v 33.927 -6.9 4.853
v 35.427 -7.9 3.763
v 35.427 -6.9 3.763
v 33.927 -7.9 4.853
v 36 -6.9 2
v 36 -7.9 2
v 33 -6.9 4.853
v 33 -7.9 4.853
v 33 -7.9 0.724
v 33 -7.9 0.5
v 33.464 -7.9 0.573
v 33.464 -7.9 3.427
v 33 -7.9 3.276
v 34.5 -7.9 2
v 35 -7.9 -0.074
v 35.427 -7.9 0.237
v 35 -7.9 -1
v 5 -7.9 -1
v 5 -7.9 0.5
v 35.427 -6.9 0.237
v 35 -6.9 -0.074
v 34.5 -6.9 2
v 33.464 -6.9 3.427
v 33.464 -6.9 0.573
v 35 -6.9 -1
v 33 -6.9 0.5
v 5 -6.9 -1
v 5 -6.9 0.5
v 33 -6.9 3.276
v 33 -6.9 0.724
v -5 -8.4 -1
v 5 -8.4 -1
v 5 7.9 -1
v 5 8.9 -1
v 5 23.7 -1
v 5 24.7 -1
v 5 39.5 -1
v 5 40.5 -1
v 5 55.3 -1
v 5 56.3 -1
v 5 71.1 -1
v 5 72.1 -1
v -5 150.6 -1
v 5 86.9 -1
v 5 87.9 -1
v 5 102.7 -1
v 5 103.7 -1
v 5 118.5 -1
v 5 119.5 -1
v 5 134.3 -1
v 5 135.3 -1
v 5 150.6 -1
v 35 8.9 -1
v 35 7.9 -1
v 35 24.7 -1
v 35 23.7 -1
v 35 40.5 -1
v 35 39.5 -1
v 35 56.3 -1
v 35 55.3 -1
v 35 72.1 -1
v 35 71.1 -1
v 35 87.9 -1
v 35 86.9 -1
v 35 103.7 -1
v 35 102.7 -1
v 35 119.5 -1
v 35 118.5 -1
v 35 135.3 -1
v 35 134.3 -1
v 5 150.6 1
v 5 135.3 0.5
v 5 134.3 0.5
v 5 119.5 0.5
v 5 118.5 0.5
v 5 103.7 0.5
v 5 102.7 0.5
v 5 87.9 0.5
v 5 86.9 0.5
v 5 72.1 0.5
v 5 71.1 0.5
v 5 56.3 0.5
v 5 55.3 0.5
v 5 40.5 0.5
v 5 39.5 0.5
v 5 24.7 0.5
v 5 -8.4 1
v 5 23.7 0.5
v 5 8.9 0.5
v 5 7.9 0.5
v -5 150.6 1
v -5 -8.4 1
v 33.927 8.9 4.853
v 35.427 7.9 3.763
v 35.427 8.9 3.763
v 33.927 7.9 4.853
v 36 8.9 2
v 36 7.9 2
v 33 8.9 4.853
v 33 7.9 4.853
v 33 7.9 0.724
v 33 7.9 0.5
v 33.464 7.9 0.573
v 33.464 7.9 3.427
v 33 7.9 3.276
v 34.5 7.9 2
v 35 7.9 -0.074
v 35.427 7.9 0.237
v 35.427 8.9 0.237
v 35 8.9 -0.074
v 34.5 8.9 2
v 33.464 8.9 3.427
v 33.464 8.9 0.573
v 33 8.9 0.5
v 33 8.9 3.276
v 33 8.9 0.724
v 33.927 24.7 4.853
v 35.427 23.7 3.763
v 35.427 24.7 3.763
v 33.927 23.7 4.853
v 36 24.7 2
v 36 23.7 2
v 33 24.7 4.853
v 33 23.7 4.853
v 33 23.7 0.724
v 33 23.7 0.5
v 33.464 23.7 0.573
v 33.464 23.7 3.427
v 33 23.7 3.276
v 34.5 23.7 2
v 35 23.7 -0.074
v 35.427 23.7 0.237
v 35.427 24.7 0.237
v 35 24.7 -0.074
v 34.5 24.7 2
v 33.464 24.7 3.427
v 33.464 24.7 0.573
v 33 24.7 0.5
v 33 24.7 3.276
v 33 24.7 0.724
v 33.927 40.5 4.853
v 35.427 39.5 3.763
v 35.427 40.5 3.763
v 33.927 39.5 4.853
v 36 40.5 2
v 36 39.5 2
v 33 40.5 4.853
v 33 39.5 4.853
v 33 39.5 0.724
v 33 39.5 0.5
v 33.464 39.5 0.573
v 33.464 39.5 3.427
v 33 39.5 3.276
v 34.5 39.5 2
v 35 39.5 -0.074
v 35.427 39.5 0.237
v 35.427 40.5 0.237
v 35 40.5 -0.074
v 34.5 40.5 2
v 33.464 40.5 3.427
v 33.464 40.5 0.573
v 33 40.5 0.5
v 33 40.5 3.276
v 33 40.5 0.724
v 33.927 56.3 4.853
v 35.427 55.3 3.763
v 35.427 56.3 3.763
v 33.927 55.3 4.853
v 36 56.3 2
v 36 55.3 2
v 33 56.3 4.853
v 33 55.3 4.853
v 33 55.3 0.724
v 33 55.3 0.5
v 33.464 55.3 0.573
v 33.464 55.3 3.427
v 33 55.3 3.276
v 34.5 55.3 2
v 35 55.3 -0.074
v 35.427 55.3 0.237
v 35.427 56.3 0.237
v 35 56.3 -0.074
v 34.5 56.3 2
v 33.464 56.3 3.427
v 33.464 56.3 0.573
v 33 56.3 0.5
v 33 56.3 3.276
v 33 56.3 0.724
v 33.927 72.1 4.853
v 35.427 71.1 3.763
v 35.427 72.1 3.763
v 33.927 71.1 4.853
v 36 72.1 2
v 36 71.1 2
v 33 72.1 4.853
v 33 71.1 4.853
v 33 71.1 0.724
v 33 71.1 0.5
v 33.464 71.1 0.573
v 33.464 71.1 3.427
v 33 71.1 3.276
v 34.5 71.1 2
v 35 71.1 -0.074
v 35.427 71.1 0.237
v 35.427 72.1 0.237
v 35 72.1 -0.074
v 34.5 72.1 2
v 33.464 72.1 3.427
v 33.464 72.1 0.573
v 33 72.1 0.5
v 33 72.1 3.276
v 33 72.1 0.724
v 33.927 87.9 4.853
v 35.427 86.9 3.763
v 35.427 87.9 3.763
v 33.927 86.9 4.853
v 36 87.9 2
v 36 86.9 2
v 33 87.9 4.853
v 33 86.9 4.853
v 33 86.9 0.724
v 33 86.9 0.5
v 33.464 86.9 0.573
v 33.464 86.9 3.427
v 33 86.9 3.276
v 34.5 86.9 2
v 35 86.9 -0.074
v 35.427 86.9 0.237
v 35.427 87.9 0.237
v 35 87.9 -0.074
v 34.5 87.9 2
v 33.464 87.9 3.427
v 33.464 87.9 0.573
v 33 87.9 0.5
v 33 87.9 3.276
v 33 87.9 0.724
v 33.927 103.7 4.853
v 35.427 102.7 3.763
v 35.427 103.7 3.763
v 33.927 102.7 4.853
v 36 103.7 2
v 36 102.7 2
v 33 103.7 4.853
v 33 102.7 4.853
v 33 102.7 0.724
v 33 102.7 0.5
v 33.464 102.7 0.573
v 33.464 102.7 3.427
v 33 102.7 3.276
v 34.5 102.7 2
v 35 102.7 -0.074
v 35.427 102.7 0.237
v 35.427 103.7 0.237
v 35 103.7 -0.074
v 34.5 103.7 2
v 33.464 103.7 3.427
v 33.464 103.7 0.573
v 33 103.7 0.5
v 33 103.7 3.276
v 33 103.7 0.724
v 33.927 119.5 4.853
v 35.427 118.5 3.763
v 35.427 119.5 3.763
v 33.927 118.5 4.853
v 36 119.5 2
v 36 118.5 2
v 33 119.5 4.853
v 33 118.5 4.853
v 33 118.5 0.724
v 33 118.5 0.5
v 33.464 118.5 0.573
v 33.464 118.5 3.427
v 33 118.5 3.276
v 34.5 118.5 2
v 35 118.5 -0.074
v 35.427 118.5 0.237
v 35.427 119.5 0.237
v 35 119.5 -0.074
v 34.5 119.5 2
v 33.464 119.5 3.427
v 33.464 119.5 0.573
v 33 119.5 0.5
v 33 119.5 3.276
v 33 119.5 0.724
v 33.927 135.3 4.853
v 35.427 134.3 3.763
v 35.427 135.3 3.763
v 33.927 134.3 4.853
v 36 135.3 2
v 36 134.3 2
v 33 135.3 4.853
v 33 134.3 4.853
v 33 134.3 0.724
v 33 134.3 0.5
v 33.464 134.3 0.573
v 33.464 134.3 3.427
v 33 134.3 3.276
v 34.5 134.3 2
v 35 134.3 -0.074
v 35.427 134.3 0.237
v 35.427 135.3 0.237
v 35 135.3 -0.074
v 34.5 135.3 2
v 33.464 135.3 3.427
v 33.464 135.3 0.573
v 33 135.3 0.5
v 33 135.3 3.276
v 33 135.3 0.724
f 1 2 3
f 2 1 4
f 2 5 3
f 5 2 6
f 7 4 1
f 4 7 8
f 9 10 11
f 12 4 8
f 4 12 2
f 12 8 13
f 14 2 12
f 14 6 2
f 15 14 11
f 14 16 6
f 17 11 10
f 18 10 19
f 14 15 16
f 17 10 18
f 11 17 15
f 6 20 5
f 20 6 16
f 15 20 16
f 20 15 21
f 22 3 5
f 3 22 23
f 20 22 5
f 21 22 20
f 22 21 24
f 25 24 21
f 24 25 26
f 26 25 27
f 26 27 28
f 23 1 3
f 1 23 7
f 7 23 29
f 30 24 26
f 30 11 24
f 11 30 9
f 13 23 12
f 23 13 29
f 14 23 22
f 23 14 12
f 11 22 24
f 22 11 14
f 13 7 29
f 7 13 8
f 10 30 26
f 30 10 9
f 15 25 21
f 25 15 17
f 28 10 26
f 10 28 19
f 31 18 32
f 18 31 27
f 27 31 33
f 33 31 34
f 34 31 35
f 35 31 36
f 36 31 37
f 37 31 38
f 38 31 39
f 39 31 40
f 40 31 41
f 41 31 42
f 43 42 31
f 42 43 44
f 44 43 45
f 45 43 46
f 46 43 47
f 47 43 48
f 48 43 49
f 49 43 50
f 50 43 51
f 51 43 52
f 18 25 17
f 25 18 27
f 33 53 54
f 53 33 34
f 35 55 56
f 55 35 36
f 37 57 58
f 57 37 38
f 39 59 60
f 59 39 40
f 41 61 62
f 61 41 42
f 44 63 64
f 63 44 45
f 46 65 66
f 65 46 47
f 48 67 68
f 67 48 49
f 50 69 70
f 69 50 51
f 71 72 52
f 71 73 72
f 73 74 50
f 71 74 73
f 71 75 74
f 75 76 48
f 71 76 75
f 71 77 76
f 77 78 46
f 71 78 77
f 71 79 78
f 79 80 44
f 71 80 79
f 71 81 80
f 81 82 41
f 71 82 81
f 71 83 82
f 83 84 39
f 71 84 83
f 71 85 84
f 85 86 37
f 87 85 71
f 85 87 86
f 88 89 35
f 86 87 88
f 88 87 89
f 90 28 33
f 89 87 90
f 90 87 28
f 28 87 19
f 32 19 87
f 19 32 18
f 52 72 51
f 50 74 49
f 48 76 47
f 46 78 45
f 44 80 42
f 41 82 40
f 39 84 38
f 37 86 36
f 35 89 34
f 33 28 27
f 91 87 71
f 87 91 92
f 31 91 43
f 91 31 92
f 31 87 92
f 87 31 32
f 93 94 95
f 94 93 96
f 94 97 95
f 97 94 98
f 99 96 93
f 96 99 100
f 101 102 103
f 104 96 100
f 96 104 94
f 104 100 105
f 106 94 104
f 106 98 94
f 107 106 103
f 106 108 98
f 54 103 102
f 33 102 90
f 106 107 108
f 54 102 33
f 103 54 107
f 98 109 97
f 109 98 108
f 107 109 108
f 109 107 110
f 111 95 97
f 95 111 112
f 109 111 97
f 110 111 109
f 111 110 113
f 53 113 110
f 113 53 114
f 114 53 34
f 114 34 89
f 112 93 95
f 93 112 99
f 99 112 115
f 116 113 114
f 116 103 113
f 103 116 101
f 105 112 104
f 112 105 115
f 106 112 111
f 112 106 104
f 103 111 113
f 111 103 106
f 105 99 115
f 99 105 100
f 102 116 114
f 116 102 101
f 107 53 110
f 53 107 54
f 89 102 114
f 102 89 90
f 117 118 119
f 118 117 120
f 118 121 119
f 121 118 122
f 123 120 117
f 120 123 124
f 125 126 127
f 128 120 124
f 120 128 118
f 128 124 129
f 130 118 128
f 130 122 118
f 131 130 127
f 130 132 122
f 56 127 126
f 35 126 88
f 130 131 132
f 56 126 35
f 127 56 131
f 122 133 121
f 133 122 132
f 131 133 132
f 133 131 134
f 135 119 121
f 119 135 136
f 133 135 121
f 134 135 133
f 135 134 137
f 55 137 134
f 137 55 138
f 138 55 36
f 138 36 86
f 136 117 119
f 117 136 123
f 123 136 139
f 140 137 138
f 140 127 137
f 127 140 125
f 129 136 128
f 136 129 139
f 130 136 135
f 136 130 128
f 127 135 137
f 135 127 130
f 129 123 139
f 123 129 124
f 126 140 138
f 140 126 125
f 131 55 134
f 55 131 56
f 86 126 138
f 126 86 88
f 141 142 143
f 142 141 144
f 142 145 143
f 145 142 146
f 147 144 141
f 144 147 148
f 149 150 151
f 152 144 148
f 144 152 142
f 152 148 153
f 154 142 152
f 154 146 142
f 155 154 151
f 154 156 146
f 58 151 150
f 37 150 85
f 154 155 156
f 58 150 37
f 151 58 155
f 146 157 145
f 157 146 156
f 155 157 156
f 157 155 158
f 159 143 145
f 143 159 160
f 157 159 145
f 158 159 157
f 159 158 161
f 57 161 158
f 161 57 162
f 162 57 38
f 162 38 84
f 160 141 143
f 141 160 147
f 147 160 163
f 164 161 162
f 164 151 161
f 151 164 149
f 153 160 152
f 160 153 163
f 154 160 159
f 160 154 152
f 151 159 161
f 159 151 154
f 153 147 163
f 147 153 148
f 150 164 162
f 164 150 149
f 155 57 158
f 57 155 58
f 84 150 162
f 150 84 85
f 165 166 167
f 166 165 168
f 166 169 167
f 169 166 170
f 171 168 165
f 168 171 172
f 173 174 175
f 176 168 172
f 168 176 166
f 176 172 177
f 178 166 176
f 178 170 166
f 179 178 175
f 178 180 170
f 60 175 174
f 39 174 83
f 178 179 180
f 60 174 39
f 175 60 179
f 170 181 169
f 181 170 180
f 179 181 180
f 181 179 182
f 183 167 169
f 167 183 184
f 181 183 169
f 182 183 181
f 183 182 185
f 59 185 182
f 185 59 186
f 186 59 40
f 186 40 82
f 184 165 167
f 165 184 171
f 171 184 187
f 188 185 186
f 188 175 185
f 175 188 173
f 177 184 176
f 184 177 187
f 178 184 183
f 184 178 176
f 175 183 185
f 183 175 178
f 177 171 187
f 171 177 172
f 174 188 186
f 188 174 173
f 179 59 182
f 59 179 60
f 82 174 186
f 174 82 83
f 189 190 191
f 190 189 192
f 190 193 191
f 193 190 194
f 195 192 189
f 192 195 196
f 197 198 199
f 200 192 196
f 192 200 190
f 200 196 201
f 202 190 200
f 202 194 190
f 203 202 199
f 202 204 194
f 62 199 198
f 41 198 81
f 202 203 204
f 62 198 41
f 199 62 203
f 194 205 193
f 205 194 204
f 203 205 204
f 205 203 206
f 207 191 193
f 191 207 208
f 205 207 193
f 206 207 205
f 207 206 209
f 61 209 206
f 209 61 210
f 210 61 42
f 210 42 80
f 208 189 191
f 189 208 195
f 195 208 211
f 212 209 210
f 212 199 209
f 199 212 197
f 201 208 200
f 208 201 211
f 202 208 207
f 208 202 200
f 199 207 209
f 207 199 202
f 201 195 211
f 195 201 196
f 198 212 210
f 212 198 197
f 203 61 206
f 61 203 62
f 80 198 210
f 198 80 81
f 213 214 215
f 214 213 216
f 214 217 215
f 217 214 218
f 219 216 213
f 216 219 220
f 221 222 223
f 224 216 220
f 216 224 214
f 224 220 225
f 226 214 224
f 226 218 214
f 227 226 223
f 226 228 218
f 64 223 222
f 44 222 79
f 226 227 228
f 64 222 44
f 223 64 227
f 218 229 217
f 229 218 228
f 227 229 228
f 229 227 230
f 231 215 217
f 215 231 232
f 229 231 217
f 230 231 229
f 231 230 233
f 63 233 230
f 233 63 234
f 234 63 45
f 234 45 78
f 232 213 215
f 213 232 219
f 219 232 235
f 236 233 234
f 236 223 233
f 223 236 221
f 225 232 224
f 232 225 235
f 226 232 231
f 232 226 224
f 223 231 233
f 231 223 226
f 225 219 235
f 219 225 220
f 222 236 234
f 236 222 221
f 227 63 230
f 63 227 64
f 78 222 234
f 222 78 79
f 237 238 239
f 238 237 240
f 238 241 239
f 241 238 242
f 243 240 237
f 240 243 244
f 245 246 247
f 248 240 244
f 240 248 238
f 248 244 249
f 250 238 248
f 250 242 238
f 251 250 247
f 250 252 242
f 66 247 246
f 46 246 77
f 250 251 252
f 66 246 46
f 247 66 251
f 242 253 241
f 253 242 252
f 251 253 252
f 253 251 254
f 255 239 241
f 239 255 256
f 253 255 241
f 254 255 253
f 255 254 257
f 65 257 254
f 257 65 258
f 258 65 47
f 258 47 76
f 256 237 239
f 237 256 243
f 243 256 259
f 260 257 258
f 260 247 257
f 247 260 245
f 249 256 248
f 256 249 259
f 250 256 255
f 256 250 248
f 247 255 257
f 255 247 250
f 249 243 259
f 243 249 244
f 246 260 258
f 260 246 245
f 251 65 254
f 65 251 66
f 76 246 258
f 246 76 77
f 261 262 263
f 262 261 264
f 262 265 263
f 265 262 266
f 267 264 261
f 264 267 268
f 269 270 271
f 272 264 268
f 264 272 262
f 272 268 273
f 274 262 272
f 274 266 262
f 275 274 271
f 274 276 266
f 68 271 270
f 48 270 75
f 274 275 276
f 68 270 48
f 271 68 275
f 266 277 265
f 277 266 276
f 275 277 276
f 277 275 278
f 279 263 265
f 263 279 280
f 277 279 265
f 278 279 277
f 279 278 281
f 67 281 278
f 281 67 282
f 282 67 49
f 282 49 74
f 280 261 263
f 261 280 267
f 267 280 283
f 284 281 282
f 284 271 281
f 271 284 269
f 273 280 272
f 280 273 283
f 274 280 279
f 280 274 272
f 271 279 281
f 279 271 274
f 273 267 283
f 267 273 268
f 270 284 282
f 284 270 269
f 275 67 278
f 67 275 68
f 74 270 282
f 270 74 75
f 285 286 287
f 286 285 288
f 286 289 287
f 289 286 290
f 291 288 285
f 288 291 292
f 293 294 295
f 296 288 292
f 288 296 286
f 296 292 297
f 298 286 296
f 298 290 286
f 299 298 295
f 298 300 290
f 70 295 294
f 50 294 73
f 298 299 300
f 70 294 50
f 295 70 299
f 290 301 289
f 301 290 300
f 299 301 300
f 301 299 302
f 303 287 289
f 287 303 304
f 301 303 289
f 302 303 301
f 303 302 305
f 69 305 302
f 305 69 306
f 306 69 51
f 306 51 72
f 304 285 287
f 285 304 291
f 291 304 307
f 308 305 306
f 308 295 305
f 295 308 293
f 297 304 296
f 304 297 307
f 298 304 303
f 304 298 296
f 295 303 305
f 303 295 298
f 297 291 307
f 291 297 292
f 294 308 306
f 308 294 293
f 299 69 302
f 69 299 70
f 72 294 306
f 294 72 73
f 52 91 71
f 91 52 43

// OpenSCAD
//create a hook
module hook(length, width, height, thickness, outer) 
{
    cube([length / 3, width + 1, thickness * 2], center = true);
    translate([length / 6 ,-width / 2, - thickness]) {
    cube([length, thickness, thickness * 1.5], center = false);
    translate([length - 2 * thickness, thickness / 2, outer]){
        rotate([90,0,0]){
            difference(){
            cylinder(h=thickness, r = outer, center=true);
            cylinder(h = 2 * thickness , r = outer - (thickness * 1.5), center = true);
            translate([-3* outer,0,0]) {
                cube([6* outer, 6 * outer, 6 * outer], center = true);
            }
        }
        }
    }
    }
}


lWidth = 15.8;

union(){
       for(i = [ 0: 1: 10-1]){
           //translate
           translate([0,lWidth * i, 0] ){
               #hook(30, lWidth, 4, 1, 3);
           }
       }
   }
